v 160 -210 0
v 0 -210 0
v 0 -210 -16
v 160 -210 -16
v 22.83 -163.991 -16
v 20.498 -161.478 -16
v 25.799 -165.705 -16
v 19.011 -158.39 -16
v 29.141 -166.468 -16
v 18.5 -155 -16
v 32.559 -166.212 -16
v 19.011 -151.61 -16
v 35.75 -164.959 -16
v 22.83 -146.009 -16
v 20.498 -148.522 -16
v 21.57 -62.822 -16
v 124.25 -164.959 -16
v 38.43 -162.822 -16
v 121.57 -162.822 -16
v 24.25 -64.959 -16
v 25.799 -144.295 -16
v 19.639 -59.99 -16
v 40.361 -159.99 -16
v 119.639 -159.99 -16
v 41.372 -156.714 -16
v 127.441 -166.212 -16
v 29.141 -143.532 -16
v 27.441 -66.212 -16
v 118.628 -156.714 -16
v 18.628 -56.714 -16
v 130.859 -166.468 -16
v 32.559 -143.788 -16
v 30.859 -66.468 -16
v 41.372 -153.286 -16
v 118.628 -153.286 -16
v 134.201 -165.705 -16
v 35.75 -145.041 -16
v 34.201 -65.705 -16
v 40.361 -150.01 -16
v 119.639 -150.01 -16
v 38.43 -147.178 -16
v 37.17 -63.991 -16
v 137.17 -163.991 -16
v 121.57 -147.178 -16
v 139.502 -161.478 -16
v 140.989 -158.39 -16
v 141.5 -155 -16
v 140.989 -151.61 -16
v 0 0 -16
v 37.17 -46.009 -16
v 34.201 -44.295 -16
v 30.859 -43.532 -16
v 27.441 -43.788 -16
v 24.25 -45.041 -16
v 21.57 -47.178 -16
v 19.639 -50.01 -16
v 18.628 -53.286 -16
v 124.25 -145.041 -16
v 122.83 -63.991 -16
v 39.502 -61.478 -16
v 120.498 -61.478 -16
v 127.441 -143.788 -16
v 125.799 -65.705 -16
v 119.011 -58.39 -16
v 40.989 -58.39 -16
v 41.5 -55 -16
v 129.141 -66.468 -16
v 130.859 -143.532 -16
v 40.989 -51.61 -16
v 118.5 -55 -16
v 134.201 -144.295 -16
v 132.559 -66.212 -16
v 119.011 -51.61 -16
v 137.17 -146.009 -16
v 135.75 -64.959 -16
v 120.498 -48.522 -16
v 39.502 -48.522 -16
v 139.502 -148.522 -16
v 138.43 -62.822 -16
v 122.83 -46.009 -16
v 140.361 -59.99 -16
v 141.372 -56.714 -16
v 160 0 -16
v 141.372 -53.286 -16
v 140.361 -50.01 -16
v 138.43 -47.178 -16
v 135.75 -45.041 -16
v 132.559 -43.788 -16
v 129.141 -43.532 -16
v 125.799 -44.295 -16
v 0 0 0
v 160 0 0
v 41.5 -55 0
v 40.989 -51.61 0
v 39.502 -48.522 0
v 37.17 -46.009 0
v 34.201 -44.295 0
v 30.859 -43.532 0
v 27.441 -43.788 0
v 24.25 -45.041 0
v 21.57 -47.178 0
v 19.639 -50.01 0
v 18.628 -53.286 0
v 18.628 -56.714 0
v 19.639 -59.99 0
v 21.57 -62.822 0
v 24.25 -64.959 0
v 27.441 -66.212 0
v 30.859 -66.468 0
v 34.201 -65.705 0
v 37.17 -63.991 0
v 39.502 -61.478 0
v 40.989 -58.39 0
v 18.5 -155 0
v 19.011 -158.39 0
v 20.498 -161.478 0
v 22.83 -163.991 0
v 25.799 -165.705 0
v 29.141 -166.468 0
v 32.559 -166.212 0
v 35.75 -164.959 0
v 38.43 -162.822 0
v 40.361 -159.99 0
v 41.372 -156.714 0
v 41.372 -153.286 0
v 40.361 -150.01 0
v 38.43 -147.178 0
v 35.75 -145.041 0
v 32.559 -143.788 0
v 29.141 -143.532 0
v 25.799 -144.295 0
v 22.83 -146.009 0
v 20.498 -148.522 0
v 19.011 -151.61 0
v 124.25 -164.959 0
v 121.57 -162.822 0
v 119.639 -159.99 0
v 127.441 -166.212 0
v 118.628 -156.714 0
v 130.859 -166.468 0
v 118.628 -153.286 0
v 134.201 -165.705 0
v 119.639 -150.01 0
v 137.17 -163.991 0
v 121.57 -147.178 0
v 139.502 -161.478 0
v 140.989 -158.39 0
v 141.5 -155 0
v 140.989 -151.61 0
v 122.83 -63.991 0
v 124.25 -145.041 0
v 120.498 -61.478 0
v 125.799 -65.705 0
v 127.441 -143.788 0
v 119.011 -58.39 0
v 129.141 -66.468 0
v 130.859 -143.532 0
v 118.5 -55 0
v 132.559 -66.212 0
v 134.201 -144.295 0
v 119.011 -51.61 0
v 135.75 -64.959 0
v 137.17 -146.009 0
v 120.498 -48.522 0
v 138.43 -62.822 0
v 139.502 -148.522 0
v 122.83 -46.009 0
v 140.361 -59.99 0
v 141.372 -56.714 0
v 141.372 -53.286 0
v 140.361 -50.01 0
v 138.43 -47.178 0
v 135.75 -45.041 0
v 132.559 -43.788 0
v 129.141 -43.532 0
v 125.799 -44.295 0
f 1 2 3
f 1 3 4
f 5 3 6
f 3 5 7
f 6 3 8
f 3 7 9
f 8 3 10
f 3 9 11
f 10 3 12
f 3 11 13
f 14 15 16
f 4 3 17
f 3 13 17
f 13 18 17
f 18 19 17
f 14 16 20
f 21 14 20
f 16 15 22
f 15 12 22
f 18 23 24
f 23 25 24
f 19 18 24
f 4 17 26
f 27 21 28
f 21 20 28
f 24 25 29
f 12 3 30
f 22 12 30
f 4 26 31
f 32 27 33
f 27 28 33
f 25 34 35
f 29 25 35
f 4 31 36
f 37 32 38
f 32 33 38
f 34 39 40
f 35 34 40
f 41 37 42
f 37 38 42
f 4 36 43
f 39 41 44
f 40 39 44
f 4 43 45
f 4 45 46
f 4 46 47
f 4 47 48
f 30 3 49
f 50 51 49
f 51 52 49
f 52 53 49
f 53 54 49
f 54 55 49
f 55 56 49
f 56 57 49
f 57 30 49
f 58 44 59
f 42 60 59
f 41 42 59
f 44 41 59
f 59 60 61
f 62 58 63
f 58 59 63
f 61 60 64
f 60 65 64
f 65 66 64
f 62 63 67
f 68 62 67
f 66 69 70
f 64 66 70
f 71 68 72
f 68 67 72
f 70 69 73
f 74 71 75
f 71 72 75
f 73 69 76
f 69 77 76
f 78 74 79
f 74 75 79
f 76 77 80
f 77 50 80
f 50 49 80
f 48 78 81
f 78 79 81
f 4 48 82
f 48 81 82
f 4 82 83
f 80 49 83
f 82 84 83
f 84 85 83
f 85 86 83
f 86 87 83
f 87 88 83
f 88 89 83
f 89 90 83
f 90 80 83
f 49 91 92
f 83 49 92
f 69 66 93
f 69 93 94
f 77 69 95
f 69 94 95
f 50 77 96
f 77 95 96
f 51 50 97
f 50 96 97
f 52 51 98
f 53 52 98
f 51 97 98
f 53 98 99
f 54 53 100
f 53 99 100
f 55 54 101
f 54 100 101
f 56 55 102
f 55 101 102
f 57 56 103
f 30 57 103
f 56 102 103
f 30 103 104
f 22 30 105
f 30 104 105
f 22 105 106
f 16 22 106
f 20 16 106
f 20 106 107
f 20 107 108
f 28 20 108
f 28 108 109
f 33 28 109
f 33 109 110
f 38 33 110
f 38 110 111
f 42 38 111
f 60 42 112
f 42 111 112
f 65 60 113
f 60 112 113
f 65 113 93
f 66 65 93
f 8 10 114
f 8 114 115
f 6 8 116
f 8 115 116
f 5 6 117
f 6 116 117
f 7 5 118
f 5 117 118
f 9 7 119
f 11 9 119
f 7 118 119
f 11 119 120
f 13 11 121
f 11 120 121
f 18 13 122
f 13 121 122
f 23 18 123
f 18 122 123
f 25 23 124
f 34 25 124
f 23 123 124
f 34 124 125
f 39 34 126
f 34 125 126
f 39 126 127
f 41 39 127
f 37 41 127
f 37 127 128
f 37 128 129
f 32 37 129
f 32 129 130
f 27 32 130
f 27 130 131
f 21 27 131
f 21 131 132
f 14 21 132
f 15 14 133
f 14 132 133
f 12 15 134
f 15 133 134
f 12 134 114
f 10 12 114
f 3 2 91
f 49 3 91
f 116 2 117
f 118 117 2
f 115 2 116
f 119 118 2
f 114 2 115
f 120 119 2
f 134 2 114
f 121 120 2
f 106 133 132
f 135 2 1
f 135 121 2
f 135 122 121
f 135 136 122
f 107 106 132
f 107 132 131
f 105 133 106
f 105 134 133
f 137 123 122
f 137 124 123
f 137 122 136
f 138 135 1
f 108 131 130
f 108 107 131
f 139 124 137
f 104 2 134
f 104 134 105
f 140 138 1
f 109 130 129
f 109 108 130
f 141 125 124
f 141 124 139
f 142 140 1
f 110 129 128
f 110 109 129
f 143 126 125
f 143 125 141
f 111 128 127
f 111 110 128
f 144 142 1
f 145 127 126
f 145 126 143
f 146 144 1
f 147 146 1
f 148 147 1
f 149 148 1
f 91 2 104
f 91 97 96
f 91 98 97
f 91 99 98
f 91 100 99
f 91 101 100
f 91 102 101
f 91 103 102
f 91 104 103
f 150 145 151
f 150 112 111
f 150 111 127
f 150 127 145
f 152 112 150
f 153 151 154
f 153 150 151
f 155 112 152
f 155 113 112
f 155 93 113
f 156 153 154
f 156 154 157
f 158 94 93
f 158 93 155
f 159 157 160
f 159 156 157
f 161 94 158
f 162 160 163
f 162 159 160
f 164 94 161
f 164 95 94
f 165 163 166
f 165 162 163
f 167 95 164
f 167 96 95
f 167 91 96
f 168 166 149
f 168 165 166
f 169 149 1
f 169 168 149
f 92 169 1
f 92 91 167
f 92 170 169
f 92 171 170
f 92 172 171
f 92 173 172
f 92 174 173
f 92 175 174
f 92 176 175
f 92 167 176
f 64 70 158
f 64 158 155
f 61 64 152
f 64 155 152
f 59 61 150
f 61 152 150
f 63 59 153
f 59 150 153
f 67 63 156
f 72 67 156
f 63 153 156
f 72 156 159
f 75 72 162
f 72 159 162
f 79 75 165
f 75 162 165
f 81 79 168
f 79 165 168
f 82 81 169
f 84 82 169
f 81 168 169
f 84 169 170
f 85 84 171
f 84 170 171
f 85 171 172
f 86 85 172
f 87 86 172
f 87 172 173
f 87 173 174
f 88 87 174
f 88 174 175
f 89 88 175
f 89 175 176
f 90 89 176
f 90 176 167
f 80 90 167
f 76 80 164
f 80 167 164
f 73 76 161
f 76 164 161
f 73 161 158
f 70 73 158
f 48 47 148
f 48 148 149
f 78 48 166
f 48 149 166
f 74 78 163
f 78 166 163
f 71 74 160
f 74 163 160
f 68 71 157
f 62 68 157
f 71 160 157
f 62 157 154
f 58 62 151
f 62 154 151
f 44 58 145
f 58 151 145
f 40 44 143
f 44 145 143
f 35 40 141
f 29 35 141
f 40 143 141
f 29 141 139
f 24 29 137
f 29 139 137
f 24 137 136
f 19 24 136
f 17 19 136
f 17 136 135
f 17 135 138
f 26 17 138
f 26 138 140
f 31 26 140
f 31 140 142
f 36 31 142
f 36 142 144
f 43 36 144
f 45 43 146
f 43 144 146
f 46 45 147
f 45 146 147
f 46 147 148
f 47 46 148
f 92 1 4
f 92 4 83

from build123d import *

# Parameters (mm, degrees)
SKETCH_1_W             = 160
SKETCH_1_H             = 210
SKETCH_1_R             = 11.5
SM_BASE_FLANGE_1_DEPTH = 16


# Sheet-metal steps are written as plain solids
with BuildPart() as part:
    # Sketch 1 → Базовая кромка1 (new body)
    with BuildSketch(Plane.XY):
        with Locations((80, -105)):
            Rectangle(SKETCH_1_W, SKETCH_1_H)
        with Locations((30, -55)):
            Circle(SKETCH_1_R, mode=Mode.SUBTRACT)
        with Locations(Location((130, -55, 0), (0, 0, 180))):
            Circle(SKETCH_1_R, mode=Mode.SUBTRACT)
        with Locations((130, -155)):
            Circle(SKETCH_1_R, mode=Mode.SUBTRACT)
        with Locations(Location((30, -155, 0), (0, 0, 180))):
            Circle(SKETCH_1_R, mode=Mode.SUBTRACT)
    extrude(amount=-SM_BASE_FLANGE_1_DEPTH)


solid = part.part
